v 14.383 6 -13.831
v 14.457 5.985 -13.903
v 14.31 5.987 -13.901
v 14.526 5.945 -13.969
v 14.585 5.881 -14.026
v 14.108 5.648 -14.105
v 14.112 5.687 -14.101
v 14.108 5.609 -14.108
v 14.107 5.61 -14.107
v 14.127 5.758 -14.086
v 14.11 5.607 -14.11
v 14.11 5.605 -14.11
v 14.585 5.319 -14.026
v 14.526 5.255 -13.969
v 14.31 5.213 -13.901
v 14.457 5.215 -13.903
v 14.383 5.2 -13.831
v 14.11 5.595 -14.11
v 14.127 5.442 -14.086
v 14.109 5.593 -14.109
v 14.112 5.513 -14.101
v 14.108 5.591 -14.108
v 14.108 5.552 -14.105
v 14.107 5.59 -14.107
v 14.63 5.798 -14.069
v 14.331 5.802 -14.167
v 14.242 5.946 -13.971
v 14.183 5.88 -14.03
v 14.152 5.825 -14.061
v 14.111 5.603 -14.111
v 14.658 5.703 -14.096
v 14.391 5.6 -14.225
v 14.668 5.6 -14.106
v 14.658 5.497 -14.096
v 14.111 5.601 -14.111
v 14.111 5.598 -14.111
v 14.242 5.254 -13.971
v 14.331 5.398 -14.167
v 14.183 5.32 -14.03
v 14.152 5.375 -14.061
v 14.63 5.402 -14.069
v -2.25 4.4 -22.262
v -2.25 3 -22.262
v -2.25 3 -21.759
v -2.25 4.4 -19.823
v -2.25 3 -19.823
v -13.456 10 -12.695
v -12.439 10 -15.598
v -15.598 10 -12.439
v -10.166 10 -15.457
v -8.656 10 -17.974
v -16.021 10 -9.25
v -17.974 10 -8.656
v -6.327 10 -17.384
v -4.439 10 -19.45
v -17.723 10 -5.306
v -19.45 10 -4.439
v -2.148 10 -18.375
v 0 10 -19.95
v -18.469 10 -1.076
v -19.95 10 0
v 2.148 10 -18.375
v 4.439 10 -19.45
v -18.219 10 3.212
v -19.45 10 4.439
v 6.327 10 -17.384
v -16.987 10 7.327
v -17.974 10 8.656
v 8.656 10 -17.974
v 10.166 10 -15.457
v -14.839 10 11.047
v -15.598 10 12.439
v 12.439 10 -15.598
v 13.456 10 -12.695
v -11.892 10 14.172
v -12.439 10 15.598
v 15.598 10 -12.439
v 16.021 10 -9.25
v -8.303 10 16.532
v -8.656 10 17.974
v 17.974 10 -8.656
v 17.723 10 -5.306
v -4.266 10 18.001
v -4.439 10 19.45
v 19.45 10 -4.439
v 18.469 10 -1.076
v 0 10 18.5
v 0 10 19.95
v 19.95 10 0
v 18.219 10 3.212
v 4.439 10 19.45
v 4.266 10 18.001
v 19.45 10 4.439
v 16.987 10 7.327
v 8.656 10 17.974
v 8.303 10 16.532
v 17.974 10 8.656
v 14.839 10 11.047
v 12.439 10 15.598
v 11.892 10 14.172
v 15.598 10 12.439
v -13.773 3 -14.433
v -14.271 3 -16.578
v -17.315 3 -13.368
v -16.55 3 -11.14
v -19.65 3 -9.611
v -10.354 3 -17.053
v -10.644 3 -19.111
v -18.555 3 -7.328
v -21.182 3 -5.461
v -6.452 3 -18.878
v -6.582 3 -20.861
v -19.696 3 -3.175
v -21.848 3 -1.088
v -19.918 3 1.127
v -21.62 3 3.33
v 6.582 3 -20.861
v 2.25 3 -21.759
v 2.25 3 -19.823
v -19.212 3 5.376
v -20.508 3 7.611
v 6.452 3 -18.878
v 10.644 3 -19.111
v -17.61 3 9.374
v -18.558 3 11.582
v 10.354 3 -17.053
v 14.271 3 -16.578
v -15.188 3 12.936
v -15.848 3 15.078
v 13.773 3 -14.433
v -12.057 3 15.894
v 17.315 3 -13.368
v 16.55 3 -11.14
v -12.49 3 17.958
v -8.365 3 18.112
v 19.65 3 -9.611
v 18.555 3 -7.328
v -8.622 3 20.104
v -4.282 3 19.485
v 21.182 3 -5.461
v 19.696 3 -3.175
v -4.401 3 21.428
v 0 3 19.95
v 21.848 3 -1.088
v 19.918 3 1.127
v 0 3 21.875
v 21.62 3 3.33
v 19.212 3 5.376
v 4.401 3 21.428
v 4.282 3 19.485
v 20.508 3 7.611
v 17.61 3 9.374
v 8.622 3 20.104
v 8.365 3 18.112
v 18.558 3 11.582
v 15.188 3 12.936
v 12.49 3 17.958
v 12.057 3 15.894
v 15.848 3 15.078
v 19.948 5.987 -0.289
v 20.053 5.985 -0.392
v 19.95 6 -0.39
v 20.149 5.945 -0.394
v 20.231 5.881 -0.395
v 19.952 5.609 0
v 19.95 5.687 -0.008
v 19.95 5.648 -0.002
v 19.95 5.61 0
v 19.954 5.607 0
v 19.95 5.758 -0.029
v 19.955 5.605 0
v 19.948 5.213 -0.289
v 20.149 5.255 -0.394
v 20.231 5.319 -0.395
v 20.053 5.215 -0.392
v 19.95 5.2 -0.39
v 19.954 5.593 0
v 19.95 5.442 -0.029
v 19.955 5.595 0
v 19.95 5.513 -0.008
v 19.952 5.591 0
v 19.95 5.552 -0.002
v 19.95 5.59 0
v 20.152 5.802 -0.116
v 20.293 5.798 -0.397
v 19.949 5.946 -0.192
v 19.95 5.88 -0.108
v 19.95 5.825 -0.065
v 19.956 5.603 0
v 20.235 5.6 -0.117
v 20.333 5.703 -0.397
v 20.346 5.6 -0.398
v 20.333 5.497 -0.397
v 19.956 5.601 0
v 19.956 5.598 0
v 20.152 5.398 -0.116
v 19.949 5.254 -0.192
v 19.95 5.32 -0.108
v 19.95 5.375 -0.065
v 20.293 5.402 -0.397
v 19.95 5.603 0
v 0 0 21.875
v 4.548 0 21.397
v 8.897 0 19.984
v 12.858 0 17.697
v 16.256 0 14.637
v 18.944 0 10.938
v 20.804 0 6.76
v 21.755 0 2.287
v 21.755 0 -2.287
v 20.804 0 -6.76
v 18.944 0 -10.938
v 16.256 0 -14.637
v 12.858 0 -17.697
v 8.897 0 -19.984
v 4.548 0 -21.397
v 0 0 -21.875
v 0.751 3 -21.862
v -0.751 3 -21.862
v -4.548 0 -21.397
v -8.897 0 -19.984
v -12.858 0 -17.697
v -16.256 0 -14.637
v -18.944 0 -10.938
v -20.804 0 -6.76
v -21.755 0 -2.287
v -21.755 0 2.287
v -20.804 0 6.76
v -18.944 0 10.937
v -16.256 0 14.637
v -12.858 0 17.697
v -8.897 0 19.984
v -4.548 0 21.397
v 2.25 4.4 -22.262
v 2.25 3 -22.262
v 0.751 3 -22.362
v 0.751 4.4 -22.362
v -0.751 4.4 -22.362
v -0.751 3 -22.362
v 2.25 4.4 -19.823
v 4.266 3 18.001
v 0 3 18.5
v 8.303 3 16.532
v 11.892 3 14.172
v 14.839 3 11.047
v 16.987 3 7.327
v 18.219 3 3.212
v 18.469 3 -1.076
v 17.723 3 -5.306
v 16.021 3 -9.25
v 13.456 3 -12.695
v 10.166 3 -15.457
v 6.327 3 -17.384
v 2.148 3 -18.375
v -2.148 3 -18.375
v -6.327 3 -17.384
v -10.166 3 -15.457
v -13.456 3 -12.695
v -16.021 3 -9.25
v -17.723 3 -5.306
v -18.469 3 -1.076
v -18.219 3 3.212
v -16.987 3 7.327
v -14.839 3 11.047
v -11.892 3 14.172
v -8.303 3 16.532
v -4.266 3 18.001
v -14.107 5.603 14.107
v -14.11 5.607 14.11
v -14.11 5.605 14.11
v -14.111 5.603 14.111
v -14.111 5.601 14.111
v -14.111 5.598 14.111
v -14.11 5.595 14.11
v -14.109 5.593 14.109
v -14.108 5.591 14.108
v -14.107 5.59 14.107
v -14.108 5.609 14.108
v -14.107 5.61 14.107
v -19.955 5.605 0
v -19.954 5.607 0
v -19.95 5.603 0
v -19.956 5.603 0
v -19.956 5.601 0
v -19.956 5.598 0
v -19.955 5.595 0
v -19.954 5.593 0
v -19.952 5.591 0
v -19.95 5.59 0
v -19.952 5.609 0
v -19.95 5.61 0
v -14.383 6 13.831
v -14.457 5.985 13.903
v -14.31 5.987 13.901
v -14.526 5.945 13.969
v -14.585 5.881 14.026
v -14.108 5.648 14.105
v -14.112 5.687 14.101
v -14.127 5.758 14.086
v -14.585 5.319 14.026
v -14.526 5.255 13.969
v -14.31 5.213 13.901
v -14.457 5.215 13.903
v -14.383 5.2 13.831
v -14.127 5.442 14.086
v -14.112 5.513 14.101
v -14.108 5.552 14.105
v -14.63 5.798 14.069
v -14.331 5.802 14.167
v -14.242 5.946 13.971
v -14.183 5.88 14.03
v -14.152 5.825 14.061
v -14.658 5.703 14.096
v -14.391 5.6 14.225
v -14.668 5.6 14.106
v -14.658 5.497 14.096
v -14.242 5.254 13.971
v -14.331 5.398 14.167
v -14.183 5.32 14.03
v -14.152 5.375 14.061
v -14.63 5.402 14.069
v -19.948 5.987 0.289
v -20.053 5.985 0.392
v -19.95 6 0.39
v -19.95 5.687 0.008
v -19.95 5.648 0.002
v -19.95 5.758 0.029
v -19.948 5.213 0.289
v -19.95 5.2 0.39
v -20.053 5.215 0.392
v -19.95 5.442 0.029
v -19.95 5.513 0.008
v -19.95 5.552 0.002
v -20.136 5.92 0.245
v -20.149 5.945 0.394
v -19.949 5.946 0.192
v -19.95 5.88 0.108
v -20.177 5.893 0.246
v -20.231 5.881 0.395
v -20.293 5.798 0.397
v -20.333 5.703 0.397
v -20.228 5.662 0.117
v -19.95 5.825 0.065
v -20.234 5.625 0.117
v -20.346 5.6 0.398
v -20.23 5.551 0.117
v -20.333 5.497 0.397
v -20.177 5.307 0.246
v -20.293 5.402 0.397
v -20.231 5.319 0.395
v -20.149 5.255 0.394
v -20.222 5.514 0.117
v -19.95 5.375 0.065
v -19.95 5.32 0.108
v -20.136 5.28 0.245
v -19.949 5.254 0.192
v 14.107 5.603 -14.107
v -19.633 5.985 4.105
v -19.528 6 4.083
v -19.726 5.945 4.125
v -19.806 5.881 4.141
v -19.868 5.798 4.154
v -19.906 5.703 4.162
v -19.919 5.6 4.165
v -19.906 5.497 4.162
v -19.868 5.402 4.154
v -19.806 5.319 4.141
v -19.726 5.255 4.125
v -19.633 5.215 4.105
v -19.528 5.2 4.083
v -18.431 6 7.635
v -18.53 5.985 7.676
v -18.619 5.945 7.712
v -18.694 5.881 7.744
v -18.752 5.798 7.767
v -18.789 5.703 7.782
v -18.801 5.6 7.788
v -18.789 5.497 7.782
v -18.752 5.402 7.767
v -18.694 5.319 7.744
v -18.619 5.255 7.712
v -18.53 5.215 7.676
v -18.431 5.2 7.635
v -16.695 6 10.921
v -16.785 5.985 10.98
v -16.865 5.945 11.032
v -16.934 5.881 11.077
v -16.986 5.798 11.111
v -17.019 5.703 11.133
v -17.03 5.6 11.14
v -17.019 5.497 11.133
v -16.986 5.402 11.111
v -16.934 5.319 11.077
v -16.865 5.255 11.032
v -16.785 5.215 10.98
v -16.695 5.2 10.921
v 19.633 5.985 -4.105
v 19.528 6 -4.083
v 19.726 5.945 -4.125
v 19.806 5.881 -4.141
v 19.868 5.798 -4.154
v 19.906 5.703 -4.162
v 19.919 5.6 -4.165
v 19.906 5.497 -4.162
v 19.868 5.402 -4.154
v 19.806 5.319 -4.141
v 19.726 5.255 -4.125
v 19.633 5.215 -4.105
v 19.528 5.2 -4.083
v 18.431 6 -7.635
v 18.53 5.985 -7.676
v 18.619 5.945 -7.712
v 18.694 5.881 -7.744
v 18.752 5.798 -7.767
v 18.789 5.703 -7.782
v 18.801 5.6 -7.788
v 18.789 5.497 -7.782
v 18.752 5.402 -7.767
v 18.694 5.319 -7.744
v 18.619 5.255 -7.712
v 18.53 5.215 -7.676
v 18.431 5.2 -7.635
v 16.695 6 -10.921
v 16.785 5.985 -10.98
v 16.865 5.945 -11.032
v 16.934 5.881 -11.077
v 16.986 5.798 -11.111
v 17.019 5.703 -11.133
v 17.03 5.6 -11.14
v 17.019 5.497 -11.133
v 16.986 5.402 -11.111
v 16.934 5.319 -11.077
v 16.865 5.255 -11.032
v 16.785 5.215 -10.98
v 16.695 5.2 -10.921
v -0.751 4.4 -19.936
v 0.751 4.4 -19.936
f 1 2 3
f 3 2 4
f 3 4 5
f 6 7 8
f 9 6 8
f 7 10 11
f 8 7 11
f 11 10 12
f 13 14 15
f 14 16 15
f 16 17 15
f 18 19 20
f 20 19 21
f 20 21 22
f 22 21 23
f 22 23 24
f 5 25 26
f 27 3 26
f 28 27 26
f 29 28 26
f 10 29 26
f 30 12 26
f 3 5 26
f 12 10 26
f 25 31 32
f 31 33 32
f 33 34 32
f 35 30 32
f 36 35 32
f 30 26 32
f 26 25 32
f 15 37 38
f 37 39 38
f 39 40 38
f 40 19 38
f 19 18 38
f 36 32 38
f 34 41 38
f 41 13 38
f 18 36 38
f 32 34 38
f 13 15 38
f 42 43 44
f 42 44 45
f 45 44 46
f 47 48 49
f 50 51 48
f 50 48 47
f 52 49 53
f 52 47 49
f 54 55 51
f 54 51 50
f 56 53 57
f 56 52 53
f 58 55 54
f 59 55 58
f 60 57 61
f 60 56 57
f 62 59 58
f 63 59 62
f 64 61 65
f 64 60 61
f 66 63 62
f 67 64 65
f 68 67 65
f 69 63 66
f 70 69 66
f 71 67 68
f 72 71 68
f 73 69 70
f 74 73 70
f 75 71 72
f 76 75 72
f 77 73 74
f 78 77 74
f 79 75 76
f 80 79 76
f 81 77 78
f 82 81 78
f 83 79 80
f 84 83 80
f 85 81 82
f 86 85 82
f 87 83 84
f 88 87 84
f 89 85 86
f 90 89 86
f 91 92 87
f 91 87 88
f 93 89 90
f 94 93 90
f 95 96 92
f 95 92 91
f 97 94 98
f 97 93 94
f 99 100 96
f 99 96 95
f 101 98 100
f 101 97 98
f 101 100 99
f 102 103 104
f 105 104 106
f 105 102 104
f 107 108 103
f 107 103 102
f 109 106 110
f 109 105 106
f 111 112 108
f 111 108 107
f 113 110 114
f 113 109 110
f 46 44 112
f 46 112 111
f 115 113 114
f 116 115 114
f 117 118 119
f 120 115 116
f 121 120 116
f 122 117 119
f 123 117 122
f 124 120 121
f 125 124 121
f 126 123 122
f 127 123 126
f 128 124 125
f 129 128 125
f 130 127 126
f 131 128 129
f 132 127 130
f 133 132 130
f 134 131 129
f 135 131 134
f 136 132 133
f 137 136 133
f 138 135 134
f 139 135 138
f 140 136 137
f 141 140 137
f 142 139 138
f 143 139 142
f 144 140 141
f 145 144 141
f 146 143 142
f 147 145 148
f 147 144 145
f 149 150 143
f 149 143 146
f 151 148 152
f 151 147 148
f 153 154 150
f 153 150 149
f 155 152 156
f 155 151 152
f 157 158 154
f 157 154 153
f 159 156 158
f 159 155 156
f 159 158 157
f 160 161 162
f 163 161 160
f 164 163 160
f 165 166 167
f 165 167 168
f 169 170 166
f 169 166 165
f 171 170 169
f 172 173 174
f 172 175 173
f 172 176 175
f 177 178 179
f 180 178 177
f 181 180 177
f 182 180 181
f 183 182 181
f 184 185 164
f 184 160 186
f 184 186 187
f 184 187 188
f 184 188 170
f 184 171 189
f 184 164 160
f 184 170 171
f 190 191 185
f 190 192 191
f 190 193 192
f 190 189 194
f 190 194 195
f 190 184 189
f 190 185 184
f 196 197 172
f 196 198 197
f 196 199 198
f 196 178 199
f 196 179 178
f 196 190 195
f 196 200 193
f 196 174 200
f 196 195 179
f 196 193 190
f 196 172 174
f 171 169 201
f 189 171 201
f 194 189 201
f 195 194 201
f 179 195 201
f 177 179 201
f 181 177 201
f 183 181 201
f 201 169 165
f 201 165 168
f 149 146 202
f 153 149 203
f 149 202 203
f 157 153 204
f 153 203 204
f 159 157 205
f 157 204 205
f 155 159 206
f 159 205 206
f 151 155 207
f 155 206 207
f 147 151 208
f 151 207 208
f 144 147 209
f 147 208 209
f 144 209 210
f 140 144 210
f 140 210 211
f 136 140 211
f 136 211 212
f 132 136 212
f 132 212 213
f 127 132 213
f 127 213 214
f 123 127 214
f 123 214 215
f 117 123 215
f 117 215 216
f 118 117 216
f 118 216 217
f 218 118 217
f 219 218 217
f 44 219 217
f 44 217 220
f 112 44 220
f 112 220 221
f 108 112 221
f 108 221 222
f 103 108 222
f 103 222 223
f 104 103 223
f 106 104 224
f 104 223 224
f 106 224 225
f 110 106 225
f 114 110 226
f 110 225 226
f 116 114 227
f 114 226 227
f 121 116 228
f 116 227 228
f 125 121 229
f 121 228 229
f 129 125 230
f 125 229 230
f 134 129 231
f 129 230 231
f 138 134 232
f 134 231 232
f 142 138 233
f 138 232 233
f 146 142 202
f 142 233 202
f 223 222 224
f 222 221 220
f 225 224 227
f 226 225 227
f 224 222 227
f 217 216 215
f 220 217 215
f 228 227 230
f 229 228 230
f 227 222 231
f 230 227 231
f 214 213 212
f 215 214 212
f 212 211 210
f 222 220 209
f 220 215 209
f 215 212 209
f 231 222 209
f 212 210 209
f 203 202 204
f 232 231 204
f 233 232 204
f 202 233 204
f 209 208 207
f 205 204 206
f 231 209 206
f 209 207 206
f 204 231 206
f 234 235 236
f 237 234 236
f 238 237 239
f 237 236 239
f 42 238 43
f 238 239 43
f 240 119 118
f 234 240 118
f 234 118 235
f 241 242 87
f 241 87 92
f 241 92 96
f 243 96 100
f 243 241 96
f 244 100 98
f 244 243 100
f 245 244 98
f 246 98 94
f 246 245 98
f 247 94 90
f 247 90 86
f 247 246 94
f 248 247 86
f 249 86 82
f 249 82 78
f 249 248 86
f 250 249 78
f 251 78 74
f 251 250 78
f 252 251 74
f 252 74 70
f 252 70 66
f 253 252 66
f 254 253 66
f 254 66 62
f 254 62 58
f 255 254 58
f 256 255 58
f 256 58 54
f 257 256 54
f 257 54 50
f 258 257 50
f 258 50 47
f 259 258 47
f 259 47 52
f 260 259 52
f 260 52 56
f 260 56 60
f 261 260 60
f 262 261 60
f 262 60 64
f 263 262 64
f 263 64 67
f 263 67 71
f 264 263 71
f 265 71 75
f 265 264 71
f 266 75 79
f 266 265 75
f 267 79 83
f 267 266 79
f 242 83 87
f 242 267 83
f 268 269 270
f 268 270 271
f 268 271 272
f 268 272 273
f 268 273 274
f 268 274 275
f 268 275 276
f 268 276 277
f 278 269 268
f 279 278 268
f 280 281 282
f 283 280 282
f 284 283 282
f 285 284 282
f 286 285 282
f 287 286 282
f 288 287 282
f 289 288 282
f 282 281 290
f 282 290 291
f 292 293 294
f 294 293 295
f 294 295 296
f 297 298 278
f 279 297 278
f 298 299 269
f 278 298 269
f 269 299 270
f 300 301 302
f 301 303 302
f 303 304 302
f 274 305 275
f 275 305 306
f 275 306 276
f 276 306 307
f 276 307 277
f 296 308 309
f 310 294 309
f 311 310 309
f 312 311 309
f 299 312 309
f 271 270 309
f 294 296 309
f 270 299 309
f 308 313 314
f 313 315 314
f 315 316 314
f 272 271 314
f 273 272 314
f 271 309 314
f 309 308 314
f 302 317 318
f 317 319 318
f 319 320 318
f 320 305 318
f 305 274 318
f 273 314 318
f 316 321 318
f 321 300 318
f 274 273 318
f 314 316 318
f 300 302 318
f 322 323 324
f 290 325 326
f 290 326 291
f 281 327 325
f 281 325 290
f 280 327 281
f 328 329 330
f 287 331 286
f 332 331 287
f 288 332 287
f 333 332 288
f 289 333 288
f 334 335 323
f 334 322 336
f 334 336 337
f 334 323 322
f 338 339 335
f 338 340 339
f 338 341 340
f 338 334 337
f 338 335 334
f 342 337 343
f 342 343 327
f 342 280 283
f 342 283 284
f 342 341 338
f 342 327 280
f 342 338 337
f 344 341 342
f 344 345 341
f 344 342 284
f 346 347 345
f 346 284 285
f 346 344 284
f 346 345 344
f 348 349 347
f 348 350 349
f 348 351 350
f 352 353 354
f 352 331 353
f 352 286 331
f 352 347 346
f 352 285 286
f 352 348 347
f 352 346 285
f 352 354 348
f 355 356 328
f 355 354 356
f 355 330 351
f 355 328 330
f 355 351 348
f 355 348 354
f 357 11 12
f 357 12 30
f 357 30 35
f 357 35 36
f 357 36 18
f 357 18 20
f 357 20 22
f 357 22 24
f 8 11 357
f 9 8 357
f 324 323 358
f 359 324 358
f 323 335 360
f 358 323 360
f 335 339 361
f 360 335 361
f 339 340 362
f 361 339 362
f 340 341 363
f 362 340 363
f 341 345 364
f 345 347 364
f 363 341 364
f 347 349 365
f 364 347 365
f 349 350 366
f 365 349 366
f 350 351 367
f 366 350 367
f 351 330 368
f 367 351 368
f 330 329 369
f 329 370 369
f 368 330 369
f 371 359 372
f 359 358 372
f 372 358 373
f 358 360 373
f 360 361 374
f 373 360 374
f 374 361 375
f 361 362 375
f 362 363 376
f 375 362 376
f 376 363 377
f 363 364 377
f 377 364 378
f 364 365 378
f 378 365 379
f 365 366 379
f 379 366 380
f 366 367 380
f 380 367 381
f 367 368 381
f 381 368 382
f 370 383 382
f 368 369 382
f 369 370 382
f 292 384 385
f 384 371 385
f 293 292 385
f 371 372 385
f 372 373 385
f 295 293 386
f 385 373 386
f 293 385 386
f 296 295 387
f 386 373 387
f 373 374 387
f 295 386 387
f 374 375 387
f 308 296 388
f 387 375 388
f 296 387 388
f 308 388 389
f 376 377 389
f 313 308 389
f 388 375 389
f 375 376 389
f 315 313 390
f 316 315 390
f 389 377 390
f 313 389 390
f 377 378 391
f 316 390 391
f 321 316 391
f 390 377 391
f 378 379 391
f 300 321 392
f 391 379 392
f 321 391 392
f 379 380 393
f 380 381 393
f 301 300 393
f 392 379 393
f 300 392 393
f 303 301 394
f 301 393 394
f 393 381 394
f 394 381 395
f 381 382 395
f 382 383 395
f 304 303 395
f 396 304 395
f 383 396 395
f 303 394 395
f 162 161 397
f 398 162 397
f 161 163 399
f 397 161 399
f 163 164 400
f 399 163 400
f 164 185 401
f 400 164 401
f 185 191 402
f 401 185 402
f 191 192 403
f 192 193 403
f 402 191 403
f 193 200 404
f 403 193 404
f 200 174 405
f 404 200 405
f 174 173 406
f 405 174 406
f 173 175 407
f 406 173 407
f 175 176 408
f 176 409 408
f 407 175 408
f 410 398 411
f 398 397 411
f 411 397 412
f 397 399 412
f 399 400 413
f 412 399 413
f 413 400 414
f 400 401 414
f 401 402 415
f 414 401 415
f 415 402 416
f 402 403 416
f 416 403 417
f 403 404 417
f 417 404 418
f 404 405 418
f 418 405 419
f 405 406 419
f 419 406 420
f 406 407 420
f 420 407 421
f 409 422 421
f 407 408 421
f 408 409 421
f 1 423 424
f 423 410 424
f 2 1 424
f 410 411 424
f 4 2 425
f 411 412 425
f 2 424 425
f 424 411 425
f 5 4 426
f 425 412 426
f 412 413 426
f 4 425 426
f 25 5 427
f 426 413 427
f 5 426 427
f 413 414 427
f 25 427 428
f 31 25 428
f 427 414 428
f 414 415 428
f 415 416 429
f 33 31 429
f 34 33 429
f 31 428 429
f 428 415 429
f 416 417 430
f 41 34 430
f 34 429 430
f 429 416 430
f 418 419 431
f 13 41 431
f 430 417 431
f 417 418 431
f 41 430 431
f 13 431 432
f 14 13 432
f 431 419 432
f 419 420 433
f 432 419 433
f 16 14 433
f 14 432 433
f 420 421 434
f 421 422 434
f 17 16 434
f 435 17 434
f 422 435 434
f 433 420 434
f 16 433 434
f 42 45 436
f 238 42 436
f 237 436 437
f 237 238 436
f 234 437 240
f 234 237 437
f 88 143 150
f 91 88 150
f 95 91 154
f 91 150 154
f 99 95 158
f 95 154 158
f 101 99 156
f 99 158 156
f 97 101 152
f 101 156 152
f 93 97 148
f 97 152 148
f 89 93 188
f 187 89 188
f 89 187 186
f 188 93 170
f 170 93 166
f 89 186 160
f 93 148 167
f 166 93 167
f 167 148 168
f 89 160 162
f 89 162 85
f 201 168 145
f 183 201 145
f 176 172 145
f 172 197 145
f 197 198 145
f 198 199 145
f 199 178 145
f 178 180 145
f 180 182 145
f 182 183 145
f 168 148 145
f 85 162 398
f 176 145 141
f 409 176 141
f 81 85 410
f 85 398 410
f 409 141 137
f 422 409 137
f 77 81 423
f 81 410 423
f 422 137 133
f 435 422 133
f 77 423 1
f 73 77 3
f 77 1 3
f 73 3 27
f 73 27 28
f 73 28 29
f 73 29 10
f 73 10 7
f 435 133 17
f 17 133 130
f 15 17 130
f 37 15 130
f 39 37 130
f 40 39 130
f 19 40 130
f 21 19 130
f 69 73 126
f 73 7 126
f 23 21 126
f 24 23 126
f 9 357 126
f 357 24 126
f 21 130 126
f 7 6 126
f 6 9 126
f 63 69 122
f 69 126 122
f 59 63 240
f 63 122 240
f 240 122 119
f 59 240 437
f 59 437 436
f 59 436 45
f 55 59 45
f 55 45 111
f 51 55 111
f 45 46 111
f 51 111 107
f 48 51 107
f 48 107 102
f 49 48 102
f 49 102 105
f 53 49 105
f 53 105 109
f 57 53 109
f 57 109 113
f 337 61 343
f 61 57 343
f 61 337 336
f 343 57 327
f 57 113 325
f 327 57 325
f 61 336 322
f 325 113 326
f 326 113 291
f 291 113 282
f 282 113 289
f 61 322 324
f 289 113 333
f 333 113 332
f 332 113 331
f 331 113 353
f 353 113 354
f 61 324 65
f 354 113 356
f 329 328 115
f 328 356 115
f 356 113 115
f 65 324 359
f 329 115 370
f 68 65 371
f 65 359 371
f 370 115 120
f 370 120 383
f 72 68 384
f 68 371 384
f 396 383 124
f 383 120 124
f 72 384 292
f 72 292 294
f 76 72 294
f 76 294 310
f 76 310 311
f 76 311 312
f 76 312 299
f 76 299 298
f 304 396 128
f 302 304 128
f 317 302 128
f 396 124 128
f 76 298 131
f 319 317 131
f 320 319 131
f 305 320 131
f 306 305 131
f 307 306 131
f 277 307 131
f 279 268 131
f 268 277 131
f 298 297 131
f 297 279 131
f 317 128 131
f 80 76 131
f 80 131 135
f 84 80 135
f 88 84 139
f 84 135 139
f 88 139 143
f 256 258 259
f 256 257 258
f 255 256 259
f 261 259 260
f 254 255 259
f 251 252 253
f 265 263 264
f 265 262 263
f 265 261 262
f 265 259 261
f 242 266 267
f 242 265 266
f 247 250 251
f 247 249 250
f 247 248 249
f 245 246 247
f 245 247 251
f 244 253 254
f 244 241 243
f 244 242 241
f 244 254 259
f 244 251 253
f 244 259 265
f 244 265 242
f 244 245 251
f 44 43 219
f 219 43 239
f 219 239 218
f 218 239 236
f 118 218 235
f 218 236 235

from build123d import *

# Parameters (mm, degrees)
SZKIC1_R                        = 21.875
DODANIE_WYCI_GNI_CIE1_DEPTH     = 3
DODANIE_WYCI_GNI_CIE2_START     = -3
SZKIC2_R                        = 19.95
SZKIC2_R_2                      = 18.5
DODANIE_WYCI_GNI_CIE2_DEPTH     = 10
DODANIE_WYCI_GNI_CIE3_DEPTH     = 1.4
SZKIC4_R                        = 0.4
OBR_T1_ANGLE                    = 45
ZAOKR_GLENIE2_R                 = 0.39
SZYK_KO_OWY5_COUNT              = 2
ZAOKR_GLENIE2_OF_SZYK_KO_OWY5_R = 0.39


with BuildPart() as part:
    # Szkic1 → Dodanie-wyciągnięcie1 (new body)
    with BuildSketch(Plane(origin=(0, 0, 0), x_dir=(1, 0, 0), z_dir=(0, 1, 0))):
        with Locations(Location((0, 0, 0), (0, 0, 270))):
            Circle(SZKIC1_R)
    extrude(amount=DODANIE_WYCI_GNI_CIE1_DEPTH)

    # Szkic2 → Dodanie-wyciągnięcie2 (add)
    with BuildSketch(Plane(origin=(0, 3, 0), x_dir=(1, 0, 0), z_dir=(0, 1, 0)).offset(DODANIE_WYCI_GNI_CIE2_START)):
        with Locations(Location((0, 0, 0), (0, 0, 270))):
            Circle(SZKIC2_R)
        with Locations(Location((0, 0, 0), (0, 0, 270))):
            Circle(SZKIC2_R_2, mode=Mode.SUBTRACT)
    extrude(amount=DODANIE_WYCI_GNI_CIE2_DEPTH)

    # Szkic3 → Dodanie-wyciągnięcie3 (add)
    with BuildSketch(Plane(origin=(0, 3, 0), x_dir=(1, 0, 0), z_dir=(0, 1, 0))):
        with BuildLine():
            Line((-2.25, 22.261584063), (-2.25, 19.822714244))
            ThreePointArc((-2.25, 19.822714244), (0, 19.95), (2.25, 19.822714244))
            Line((2.25, 19.822714244), (2.25, 22.261584063))
            ThreePointArc((2.25, 22.261584063), (0, 22.375), (-2.25, 22.261584063))
        make_face()
    extrude(amount=DODANIE_WYCI_GNI_CIE3_DEPTH)

    # Szkic4 → Obrót1 (revolve)
    with BuildSketch(Plane.XY):
        with Locations((-19.95, 5.6)):
            Circle(SZKIC4_R)
    obr_t1 = revolve(axis=Axis((0, -2.774596357, 0), (0, 1, 0)), revolution_arc=OBR_T1_ANGLE)

    # Zaokrąglenie2
    zaokr_glenie2_edges = [part.edges().sort_by_distance(p)[0] for p in [
        (-14.389622997, 5.6, 14.389622997),
        (-20.35, 5.6, 0),
    ]]
    fillet(zaokr_glenie2_edges, radius=ZAOKR_GLENIE2_R)

    # Szyk kołowy5: Obrót1 ×2 about axis
    szyk_ko_owy5_axis = Axis((0, 10, 0), (0, -1, 0))
    for i in range(1, SZYK_KO_OWY5_COUNT):
        add(obr_t1.rotate(szyk_ko_owy5_axis, i * 360 / SZYK_KO_OWY5_COUNT))

    # Zaokrąglenie2 of Szyk kołowy5
    zaokr_glenie2_of_szyk_ko_owy5_edges = [part.edges().sort_by_distance(p)[0] for p in [
        (14.389622997, 5.6, -14.389622997),
        (20.35, 5.6, 0),
    ]]
    fillet(zaokr_glenie2_of_szyk_ko_owy5_edges, radius=ZAOKR_GLENIE2_OF_SZYK_KO_OWY5_R)


solid = part.part
